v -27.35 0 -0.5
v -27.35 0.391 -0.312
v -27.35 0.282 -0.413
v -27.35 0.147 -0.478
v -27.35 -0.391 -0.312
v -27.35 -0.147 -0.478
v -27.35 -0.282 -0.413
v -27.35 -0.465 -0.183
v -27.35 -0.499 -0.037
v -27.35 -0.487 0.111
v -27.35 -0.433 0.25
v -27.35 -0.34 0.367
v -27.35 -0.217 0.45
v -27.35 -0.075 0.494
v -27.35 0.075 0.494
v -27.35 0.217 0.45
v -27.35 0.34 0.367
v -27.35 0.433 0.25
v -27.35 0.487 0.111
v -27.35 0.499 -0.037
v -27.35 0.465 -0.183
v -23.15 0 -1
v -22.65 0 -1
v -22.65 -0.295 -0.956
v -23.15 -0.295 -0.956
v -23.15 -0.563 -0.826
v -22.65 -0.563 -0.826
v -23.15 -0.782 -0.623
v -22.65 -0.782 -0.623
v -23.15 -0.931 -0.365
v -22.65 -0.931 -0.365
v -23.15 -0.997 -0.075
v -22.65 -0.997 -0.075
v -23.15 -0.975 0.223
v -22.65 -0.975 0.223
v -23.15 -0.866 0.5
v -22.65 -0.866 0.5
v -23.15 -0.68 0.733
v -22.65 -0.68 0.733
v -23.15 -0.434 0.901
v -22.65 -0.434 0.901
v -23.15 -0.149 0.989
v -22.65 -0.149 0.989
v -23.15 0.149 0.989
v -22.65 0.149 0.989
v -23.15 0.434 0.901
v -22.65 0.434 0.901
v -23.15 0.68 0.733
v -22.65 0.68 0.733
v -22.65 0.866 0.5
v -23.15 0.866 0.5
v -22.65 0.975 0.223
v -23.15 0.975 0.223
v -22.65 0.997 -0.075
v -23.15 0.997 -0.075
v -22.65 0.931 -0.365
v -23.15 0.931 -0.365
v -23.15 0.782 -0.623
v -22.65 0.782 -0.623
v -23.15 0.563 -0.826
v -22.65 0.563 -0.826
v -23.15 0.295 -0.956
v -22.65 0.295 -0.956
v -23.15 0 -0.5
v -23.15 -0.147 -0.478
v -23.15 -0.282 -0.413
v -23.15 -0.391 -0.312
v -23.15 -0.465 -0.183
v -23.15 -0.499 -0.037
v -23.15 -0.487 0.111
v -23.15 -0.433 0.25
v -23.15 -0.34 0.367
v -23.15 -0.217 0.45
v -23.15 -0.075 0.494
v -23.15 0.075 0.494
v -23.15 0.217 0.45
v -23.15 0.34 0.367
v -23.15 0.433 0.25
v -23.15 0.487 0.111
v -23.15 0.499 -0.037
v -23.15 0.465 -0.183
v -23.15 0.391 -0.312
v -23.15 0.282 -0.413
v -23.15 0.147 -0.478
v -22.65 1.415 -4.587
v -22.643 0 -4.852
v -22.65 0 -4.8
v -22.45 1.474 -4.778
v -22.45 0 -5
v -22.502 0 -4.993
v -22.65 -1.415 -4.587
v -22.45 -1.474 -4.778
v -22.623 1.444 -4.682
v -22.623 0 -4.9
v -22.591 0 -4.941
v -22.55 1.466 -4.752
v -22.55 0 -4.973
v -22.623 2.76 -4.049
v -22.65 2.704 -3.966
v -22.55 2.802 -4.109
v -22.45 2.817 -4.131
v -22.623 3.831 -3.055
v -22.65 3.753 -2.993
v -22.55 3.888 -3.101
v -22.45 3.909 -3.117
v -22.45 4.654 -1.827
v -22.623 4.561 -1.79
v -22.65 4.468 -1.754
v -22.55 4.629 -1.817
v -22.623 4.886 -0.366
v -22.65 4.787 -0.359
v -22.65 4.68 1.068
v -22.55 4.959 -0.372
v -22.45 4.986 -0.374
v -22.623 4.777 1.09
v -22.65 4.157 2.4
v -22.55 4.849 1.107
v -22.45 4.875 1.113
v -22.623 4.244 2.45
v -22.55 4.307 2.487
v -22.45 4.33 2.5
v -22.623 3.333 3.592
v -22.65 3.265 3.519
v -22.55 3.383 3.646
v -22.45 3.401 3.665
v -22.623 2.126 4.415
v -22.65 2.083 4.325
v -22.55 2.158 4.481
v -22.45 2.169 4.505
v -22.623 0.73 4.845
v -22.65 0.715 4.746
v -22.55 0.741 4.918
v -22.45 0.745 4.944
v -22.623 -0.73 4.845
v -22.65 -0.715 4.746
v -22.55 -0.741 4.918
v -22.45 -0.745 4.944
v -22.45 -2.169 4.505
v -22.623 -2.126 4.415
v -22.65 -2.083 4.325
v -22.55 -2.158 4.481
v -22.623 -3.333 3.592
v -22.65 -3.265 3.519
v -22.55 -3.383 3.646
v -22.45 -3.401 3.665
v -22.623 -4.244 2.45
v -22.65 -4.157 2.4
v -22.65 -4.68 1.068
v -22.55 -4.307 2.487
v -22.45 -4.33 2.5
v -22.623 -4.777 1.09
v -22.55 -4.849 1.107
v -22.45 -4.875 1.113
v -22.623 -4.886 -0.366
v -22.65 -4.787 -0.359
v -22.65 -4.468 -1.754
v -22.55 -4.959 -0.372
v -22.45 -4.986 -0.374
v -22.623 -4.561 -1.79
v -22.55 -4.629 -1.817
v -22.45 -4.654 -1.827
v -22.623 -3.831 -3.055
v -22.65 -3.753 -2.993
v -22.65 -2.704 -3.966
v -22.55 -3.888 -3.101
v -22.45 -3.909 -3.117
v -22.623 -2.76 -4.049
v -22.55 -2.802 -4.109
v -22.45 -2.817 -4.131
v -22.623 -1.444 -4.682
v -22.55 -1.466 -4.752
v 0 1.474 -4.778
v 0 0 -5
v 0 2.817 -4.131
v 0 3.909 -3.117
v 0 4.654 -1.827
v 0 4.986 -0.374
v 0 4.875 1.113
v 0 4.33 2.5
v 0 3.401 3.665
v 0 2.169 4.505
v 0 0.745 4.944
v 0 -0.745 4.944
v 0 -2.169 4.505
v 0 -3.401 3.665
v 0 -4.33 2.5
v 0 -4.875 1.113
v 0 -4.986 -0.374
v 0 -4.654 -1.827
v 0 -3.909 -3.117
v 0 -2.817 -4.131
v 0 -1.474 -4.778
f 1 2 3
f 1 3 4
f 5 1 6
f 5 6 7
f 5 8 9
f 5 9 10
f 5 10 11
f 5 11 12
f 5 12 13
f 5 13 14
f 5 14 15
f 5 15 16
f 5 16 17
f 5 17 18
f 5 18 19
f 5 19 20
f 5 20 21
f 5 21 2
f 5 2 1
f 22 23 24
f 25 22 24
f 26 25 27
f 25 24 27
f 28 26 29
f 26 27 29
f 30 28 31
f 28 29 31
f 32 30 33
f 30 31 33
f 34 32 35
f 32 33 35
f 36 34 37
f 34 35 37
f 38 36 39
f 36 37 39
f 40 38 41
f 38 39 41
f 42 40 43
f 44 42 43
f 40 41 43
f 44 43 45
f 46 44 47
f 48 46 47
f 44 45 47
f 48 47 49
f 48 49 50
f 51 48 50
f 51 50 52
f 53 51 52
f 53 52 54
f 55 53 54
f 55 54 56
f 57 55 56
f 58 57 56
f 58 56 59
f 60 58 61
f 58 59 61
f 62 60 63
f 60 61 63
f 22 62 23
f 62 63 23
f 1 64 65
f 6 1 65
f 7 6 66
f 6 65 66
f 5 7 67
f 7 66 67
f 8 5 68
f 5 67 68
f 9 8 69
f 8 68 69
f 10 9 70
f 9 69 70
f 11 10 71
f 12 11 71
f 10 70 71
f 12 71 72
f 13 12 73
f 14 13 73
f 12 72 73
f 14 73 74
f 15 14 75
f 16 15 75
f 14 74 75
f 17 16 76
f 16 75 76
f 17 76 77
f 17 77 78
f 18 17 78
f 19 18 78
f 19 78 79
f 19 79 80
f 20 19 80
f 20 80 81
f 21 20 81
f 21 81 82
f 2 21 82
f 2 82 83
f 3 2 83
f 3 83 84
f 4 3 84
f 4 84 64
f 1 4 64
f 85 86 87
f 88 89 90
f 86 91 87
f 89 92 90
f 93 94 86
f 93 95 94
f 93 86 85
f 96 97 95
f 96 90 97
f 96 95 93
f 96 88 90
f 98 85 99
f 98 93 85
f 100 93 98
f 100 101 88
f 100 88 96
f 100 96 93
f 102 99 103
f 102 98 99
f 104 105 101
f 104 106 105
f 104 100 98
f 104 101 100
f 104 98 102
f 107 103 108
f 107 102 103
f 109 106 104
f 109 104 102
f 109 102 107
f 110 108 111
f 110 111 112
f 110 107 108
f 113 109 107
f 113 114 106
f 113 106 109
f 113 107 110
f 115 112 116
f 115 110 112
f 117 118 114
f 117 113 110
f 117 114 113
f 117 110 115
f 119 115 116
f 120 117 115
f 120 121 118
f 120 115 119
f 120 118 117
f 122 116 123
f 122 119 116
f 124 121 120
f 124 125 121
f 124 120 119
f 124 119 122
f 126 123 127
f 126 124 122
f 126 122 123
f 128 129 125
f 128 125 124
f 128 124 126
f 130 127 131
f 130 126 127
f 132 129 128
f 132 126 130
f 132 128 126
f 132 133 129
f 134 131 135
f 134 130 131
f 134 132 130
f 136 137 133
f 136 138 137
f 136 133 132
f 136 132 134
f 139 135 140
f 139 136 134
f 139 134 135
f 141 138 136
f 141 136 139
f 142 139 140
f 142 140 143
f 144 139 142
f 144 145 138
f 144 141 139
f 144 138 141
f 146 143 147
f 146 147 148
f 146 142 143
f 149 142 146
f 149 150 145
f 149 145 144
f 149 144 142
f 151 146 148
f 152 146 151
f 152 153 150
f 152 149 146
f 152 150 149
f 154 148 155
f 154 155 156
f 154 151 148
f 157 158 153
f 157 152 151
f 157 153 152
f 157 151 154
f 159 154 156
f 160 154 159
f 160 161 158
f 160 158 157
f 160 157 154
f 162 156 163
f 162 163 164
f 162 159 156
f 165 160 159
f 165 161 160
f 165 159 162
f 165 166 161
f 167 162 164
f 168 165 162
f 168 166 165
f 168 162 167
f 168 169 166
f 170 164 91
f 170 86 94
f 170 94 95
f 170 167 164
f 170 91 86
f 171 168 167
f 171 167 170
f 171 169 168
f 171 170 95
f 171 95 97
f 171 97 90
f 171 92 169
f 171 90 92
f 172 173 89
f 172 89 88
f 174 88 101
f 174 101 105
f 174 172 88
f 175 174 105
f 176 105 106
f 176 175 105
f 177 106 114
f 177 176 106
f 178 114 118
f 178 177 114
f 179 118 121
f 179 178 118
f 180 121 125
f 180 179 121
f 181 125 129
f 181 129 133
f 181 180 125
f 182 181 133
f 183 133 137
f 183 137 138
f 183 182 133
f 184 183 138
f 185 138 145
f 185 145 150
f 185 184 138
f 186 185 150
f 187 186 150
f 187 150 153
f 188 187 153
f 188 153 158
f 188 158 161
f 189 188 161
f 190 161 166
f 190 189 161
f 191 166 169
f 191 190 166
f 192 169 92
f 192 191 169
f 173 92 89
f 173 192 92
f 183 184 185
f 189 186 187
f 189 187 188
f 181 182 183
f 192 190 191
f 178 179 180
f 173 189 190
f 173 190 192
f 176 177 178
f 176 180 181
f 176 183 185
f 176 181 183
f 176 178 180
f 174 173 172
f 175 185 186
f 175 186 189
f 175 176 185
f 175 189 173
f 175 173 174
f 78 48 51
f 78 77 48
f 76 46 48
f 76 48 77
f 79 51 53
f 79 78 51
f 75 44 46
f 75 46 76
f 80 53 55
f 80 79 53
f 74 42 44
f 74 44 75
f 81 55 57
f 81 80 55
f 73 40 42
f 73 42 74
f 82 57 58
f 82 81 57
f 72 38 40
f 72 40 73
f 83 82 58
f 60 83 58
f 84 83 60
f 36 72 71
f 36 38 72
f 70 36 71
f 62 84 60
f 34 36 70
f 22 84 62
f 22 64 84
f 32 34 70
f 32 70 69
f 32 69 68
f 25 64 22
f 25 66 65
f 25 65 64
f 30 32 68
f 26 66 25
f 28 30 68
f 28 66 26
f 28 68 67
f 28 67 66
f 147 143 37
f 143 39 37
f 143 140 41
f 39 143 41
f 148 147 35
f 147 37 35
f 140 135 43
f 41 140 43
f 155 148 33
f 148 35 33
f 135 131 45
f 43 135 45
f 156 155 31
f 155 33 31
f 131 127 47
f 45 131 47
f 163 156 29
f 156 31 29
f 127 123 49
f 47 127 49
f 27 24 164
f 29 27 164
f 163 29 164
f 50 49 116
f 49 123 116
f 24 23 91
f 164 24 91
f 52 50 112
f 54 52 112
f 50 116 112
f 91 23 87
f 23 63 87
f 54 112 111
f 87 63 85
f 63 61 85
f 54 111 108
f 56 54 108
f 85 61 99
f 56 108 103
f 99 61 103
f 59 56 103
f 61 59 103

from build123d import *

# Parameters (mm, degrees)
ESBO_O2_R                = 5
RESSALTO_EXTRUS_O1_DEPTH = 22.65
ESBO_O3_R                = 0.5
RESSALTO_EXTRUS_O2_DEPTH = 4.7
ESBO_O4_R                = 1
RESSALTO_EXTRUS_O3_DEPTH = 0.5
FILETE1_R                = 0.2


with BuildPart() as part:
    # Esboço2 → Ressalto-extrusão1 (new body)
    with BuildSketch(Plane(origin=(0, 0, 0), x_dir=(0, 0, -1), z_dir=(1, 0, 0))):
        Circle(ESBO_O2_R)
    extrude(amount=-RESSALTO_EXTRUS_O1_DEPTH)

    # Esboço3 → Ressalto-extrusão2 (add)
    with BuildSketch(Plane.ZY.offset(22.65)):
        with Locations(Location((0, 0, 0), (0, 0, 180))):
            Circle(ESBO_O3_R)
    extrude(amount=RESSALTO_EXTRUS_O2_DEPTH)

    # Esboço4 → Ressalto-extrusão3 (add)
    with BuildSketch(Plane.ZY.offset(22.65)):
        with Locations(Location((0, 0, 0), (0, 0, 180))):
            Circle(ESBO_O4_R)
    extrude(amount=RESSALTO_EXTRUS_O3_DEPTH)

    # Filete1
    filete1_edges = [part.edges().sort_by_distance(p)[0] for p in [
        (-22.65, 0, 5),
    ]]
    fillet(filete1_edges, radius=FILETE1_R)


solid = part.part
